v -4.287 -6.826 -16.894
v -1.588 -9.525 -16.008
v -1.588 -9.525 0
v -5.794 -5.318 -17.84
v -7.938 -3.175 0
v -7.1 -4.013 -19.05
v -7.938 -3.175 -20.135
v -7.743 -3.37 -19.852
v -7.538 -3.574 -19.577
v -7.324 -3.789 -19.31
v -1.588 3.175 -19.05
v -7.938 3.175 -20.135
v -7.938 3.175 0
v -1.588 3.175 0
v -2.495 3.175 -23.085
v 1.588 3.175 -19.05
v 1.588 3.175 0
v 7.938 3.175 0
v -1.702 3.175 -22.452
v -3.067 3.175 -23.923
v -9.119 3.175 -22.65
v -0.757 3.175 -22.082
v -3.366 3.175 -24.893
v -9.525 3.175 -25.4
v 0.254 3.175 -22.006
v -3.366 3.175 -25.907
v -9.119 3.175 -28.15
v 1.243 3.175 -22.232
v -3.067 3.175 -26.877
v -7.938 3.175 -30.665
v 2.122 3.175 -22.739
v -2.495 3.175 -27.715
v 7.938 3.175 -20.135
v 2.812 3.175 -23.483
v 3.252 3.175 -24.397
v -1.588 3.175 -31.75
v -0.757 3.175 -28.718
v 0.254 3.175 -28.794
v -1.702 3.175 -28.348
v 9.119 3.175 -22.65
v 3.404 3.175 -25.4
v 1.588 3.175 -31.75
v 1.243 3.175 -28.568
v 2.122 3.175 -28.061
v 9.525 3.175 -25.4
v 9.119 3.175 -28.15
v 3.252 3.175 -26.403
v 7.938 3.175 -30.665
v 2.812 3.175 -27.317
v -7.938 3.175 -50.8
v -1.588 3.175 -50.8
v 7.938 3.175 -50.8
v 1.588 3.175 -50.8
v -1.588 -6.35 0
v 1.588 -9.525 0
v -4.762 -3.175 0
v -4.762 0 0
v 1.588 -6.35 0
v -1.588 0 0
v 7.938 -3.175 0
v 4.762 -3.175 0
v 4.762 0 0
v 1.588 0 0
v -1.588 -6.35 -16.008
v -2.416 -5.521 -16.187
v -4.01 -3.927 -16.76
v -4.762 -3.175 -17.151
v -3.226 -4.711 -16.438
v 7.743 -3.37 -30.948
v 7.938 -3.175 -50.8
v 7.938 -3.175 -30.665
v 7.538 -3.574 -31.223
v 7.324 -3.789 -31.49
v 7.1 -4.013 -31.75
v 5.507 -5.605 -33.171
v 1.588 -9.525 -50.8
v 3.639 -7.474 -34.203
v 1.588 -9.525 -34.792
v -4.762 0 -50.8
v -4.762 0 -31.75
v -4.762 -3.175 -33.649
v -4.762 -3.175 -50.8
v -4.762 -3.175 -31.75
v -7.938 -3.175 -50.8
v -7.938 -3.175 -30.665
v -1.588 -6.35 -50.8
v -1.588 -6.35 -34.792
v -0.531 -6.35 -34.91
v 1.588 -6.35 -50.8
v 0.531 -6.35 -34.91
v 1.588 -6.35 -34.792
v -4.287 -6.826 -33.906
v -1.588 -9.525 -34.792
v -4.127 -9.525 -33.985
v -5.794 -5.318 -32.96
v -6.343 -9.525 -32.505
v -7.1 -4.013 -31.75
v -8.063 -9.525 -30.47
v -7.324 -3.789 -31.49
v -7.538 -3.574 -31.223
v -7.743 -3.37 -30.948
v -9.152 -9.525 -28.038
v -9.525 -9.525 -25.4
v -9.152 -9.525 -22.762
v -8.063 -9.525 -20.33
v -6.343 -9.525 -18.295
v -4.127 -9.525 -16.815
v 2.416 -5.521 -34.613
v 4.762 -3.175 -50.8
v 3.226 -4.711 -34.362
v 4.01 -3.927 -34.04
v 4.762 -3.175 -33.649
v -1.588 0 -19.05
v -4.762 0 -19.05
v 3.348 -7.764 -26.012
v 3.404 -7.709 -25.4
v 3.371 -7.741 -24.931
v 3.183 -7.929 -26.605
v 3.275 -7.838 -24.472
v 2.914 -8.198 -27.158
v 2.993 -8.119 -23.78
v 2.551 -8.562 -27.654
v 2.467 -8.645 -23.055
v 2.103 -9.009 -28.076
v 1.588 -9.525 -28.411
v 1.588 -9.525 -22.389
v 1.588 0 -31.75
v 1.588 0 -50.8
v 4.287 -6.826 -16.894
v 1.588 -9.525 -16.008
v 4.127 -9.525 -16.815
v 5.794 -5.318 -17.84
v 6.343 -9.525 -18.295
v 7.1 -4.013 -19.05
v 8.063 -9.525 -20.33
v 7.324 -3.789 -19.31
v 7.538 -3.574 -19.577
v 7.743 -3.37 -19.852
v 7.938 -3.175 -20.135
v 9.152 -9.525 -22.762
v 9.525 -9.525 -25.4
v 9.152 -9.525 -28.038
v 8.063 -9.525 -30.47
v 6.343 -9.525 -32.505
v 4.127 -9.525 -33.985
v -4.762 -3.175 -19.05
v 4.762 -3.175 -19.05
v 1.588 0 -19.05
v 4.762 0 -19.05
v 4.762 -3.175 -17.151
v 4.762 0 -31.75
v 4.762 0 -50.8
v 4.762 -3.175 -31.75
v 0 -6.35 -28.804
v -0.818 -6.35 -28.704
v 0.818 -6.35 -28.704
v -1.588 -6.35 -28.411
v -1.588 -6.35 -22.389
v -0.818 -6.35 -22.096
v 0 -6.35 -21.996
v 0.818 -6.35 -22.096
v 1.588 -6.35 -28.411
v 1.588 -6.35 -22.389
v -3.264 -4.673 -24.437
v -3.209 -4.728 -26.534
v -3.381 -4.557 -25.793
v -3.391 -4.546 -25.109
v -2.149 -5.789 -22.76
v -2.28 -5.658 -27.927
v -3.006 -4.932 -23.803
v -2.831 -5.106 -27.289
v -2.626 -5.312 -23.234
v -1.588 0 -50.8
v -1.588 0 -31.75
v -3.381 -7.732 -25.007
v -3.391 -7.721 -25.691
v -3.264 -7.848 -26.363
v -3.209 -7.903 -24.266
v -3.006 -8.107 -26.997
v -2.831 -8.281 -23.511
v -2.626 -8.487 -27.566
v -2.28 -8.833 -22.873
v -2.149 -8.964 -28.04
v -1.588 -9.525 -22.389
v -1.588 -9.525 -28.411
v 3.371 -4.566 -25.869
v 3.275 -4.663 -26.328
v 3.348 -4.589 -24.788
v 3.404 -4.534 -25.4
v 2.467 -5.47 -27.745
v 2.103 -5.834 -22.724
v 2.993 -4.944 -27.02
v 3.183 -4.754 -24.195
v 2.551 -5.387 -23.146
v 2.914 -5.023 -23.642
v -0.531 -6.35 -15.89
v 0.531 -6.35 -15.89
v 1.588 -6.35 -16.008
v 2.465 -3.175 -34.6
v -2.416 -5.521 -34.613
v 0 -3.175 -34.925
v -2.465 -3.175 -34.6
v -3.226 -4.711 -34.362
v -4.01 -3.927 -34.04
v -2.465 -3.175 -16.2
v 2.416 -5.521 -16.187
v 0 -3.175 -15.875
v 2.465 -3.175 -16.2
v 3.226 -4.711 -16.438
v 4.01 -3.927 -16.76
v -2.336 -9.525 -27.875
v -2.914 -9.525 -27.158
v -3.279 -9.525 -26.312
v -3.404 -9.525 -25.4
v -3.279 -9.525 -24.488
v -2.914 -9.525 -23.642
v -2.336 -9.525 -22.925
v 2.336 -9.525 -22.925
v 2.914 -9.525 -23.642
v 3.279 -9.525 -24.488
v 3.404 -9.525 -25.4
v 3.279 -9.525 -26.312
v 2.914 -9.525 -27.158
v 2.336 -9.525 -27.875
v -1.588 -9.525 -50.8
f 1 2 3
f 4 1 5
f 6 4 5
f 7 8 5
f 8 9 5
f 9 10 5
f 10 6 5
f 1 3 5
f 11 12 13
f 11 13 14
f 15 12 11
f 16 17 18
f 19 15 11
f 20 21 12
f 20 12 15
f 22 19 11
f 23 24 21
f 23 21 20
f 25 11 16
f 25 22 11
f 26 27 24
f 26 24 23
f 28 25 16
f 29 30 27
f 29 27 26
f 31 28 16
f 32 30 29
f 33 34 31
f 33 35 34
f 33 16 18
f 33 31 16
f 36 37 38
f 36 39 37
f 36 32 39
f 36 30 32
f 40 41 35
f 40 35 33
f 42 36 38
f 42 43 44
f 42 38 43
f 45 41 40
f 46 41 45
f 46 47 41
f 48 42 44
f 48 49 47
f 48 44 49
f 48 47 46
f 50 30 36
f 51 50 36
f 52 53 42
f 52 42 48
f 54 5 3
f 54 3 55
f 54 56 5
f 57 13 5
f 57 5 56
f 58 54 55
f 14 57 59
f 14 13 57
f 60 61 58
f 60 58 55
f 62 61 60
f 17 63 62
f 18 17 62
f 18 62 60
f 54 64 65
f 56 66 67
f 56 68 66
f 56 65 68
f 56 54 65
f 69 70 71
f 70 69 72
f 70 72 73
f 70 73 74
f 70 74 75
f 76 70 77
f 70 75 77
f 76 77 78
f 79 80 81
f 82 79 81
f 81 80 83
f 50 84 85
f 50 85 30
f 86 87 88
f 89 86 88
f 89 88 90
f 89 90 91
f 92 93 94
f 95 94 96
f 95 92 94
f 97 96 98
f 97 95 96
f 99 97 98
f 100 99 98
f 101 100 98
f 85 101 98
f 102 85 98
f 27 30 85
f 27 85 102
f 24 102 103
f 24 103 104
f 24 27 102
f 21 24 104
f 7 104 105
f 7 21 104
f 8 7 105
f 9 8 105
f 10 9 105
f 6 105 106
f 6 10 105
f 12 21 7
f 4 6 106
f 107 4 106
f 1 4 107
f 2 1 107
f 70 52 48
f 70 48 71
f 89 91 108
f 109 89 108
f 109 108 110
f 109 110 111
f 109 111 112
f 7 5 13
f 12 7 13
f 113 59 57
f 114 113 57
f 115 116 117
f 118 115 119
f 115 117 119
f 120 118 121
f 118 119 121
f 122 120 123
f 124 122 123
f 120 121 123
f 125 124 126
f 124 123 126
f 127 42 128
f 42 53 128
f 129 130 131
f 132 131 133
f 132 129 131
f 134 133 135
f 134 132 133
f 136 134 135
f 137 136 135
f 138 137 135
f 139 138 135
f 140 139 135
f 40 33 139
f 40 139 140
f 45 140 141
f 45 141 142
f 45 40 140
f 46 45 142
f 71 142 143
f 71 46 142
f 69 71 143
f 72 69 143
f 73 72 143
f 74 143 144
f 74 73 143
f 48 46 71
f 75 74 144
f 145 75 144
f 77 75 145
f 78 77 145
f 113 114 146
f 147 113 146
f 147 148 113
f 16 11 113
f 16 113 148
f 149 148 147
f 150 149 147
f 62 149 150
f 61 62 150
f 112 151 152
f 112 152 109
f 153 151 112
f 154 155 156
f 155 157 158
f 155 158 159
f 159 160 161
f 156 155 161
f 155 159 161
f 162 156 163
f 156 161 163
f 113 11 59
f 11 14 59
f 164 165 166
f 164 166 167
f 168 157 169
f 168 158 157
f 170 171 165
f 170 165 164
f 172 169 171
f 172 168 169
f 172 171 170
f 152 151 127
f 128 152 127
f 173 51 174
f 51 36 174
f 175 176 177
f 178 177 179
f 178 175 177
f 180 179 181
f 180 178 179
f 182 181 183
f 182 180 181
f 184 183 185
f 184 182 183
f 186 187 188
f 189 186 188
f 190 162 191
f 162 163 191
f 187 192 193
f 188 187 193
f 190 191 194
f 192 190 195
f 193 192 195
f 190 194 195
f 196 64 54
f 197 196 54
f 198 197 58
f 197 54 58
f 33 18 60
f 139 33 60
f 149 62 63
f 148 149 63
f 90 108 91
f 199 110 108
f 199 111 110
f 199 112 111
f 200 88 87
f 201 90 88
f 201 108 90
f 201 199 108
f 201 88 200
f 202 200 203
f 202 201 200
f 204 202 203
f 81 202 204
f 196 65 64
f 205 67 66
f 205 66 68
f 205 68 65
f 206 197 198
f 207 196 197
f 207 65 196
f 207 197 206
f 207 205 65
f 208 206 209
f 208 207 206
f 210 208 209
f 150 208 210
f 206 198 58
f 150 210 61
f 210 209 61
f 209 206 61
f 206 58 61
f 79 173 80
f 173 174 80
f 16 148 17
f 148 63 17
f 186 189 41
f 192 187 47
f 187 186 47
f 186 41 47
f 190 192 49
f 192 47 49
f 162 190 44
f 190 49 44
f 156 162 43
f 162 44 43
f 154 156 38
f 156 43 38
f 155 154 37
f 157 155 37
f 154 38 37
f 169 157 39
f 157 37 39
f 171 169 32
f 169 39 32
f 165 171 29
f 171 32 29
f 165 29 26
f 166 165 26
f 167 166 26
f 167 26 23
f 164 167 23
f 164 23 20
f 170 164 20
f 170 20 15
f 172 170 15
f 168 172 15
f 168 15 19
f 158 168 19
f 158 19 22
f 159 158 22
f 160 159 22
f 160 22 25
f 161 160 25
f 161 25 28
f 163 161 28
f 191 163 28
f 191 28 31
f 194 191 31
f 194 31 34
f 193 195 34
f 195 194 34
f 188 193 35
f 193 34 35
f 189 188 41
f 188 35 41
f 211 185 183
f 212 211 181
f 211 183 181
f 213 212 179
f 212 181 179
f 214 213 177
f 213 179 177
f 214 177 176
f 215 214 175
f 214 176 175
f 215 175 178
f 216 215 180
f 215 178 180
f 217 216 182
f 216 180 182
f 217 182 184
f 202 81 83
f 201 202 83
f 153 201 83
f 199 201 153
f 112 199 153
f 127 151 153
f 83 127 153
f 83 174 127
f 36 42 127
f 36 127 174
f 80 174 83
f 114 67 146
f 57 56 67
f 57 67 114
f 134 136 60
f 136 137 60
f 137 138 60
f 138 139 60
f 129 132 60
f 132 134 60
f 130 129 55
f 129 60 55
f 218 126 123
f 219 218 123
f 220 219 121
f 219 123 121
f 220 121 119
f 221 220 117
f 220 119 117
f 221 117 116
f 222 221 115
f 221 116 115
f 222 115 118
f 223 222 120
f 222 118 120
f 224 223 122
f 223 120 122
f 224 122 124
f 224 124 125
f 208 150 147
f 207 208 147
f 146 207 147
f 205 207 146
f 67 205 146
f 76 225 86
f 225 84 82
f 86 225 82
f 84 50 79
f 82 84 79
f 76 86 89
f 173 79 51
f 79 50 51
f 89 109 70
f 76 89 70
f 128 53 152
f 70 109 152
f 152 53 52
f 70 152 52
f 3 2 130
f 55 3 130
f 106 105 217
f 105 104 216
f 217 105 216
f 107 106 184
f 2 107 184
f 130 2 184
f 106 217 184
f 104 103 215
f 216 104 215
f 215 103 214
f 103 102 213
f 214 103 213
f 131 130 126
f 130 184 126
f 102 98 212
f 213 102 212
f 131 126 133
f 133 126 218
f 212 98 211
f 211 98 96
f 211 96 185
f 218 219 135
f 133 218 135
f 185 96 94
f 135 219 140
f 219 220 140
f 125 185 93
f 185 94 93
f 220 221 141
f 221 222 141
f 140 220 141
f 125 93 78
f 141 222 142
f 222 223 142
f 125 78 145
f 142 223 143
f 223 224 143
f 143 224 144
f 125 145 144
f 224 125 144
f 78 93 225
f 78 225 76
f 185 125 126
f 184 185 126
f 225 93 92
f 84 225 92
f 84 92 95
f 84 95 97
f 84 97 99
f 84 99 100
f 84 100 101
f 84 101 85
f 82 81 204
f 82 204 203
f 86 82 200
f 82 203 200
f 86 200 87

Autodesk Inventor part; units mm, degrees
ref_plane "YZ Plane" through (0, 0, 0) normal (1, 0, 0) x (0, 1, 0)
ref_plane "XZ Plane" through (0, 0, 0) normal (0, 1, 0) x (-1, 0, 0)
ref_plane "XY Plane" through (0, 0, 0) normal (0, 0, 1) x (1, 0, 0)
sketch "Sketch1" plane through (0, 0, 0) normal (0, 0, 1) x (1, 0, 0)
  line L0 (1.5875, 3.175) -> (7.9375, 3.175)
  line L1 (7.9375, 3.175) -> (7.9375, 0)
  line L2 (7.9375, 0) -> (1.5875, 0)
  line L3 (1.5875, 0) -> (1.5875, 3.175)
  line L4 (-7.9375, 3.175) -> (-1.5875, 3.175)
  line L5 (-1.5875, 3.175) -> (-1.5875, 0)
  line L6 (-1.5875, 0) -> (-7.9375, 0)
  line L7 (-7.9375, 0) -> (-7.9375, 3.175)
  line L8 (7.9375, 0) -> (4.7625, 0)
  line L9 (4.7625, 0) -> (4.7625, -3.175)
  line L10 (4.7625, -3.175) -> (7.9375, -3.175)
  line L11 (7.9375, -3.175) -> (7.9375, 0)
  line L12 (-7.9375, 0) -> (-4.7625, 0)
  line L13 (-4.7625, 0) -> (-4.7625, -3.175)
  line L14 (-4.7625, -3.175) -> (-7.9375, -3.175)
  line L15 (-7.9375, -3.175) -> (-7.9375, 0)
  line L16 (-4.7625, -3.175) -> (-1.5875, -6.35)
  line L17 (-1.5875, -6.35) -> (1.5875, -6.35)
  line L18 (1.5875, -6.35) -> (4.7625, -3.175)
  line L19 (7.9375, -3.175) -> (1.5875, -9.525)
  line L20 (1.5875, -9.525) -> (-1.5875, -9.525)
  line L21 (-1.5875, -9.525) -> (-7.9375, -3.175)
  line L22 (-7.9375, -3.175) -> (-4.7625, -3.175)
  point P0 (0, 0)
  dimension "d0" = 6.35
  dimension "d1" = 3.175
  dimension "d2" = 1.5875
  dimension "d3" = 3.175
  dimension "d4" = 6.35
  dimension "d5" = 3.175
  dimension "d6" = 3.175
  dimension "d7" = 4.7625
  dimension "d8" = 4.7625
  dimension "d9" = 3.175
  dimension "d10" = 3.175
  dimension "d11" = 135
  dimension "d12" = 3.175
extrude "Extrusion1" add sketch "Sketch1" against normal blind 50.8
sketch "Sketch2" plane through (7.9375, -3.175, 0) normal (1, 0, 0) x (0, 0, -1)
  line L0 (0, 3.175) -> (50.8, 3.175) projected
  line L1 (3.175, 3.175) -> (6.35, 3.175)
  line L2 (6.35, 3.175) -> (6.35, -6.35)
  line L3 (6.35, -6.35) -> (3.175, -6.35)
  line L4 (3.175, -6.35) -> (3.175, 3.175)
  line L5 (0, 0) -> (0, 6.35) projected
  line L6 (9.525, 3.175) -> (12.7, 3.175)
  line L7 (12.7, 3.175) -> (12.7, -6.35)
  line L8 (12.7, -6.35) -> (9.525, -6.35)
  line L9 (9.525, -6.35) -> (9.525, 3.175)
  line L10 (15.875, 3.175) -> (19.05, 3.175)
  line L11 (19.05, 3.175) -> (19.05, -6.35)
  line L12 (19.05, -6.35) -> (15.875, -6.35)
  line L13 (15.875, -6.35) -> (15.875, 3.175)
  line L14 (22.225, 3.175) -> (25.4, 3.175)
  line L15 (25.4, 3.175) -> (25.4, -6.35)
  line L16 (25.4, -6.35) -> (22.225, -6.35)
  line L17 (22.225, -6.35) -> (22.225, 3.175)
  line L18 (28.575, 3.175) -> (31.75, 3.175)
  line L19 (31.75, 3.175) -> (31.75, -6.35)
  line L20 (31.75, -6.35) -> (28.575, -6.35)
  line L21 (28.575, -6.35) -> (28.575, 3.175)
  line L22 (34.925, 3.175) -> (38.1, 3.175)
  line L23 (38.1, 3.175) -> (38.1, -6.35)
  line L24 (38.1, -6.35) -> (34.925, -6.35)
  line L25 (34.925, -6.35) -> (34.925, 3.175)
  line L26 (41.275, 3.175) -> (44.45, 3.175)
  line L27 (44.45, 3.175) -> (44.45, -6.35)
  line L28 (44.45, -6.35) -> (41.275, -6.35)
  line L29 (41.275, -6.35) -> (41.275, 3.175)
  line L30 (47.625, 3.175) -> (50.8, 3.175)
  line L31 (50.8, 3.175) -> (50.8, -6.35)
  line L32 (50.8, -6.35) -> (47.625, -6.35)
  line L33 (47.625, -6.35) -> (47.625, 3.175)
  dimension "d15" = 3.175
  dimension "d16" = 3.175
  dimension "d17" = 9.525
  dimension "d18" = 3.175
  dimension "d19" = 3.175
  dimension "d20" = 3.175
  dimension "d21" = 3.175
  dimension "d22" = 3.175
  dimension "d23" = 3.175
  dimension "d24" = 3.175
  dimension "d25" = 3.175
  dimension "d26" = 3.175
  dimension "d27" = 3.175
  dimension "d28" = 3.175
  dimension "d29" = 3.175
  dimension "d30" = 3.175
  dimension "d31" = 3.175
extrude "Extrusion2" cut sketch "Sketch2" against normal blind 6.35
sketch "Sketch3" plane through (-7.9375, -3.175, 0) normal (-1, 0, 0) x (0, 0, 1)
  line L0 (-3.175, 3.175) -> (-3.175, 3.175)
  line L1 (-50.8, 3.175) -> (-47.625, 3.175)
  line L2 (-47.625, 3.175) -> (-47.625, -6.35)
  line L3 (-47.625, -6.35) -> (-50.8, -6.35)
  line L4 (-50.8, -6.35) -> (-50.8, 3.175)
  line L5 (-44.45, 3.175) -> (-41.275, 3.175)
  line L6 (-41.275, 3.175) -> (-41.275, -6.35)
  line L7 (-41.275, -6.35) -> (-44.45, -6.35)
  line L8 (-44.45, -6.35) -> (-44.45, 3.175)
  line L9 (-38.1, 3.175) -> (-34.925, 3.175)
  line L10 (-34.925, 3.175) -> (-34.925, -6.35)
  line L11 (-34.925, -6.35) -> (-38.1, -6.35)
  line L12 (-38.1, -6.35) -> (-38.1, 3.175)
  line L13 (-31.75, 3.175) -> (-28.575, 3.175)
  line L14 (-28.575, 3.175) -> (-28.575, -6.35)
  line L15 (-28.575, -6.35) -> (-31.75, -6.35)
  line L16 (-31.75, -6.35) -> (-31.75, 3.175)
  line L17 (-25.4, 3.175) -> (-22.225, 3.175)
  line L18 (-22.225, 3.175) -> (-22.225, -6.35)
  line L19 (-22.225, -6.35) -> (-25.4, -6.35)
  line L20 (-25.4, -6.35) -> (-25.4, 3.175)
  line L21 (-19.05, 3.175) -> (-15.875, 3.175)
  line L22 (-15.875, 3.175) -> (-15.875, -6.35)
  line L23 (-15.875, -6.35) -> (-19.05, -6.35)
  line L24 (-19.05, -6.35) -> (-19.05, 3.175)
  line L25 (-12.7, 3.175) -> (-9.525, 3.175)
  line L26 (-9.525, 3.175) -> (-9.525, -6.35)
  line L27 (-9.525, -6.35) -> (-12.7, -6.35)
  line L28 (-12.7, -6.35) -> (-12.7, 3.175)
  line L29 (-6.35, -6.35) -> (-6.35, 3.175)
  line L30 (-6.35, 3.175) -> (-3.175, 3.175)
  line L31 (-3.175, 3.175) -> (-3.175, -6.35)
  line L32 (-3.175, -6.35) -> (-6.35, -6.35)
  point P0 (0, 3.175)
  point P1 (-3.175, 0)
  dimension "d34" = 3.175
  dimension "d35" = 9.525
  dimension "d36" = 3.175
  dimension "d37" = 3.175
  dimension "d38" = 3.175
  dimension "d39" = 3.175
  dimension "d40" = 3.175
  dimension "d41" = 3.175
  dimension "d42" = 3.175
  dimension "d43" = 3.175
  dimension "d44" = 3.175
  dimension "d45" = 3.175
  dimension "d46" = 3.175
  dimension "d47" = 3.175
  dimension "d48" = 3.175
  dimension "d49" = 3.175
extrude "Extrusion3" cut sketch "Sketch3" against normal blind 6.35
sketch "Sketch4" plane through (-7.9375, 3.175, 0) normal (0, 1, 0) x (1, 0, 0)
  circle A0 centre (7.9375, 25.4) radius 9.525
  point P0 (7.9375, 0)
  dimension "d52" = 19.05
extrude "Extrusion4" add sketch "Sketch4" against normal blind 12.7
sketch "Sketch5" plane through (-7.9375, 3.175, 0) normal (0, 1, 0) x (1, 0, 0)
  arc A0 (6.35, 34.7918) -> (6.35, 16.0082) centre (7.9375, 25.4) ccw projected
  circle A1 centre (7.9375, 25.4) radius 3.4036
  point P0 (7.9375, 0)
  dimension "d55" = 6.8072
extrude "Extrusion5" cut sketch "Sketch5" against normal blind 12.7
sketch "Sketch6" plane through (0, 0, 0) normal (0, 0, 1) x (1, 0, 0)
  line L0 (-1.5875, 3.175) -> (-1.5875, 0) projected
  line L1 (-1.5875, 3.175) -> (1.5875, 3.175)
  line L2 (1.5875, 3.175) -> (1.5875, -3.175)
  line L3 (1.5875, -3.175) -> (-1.5875, -3.175)
  line L4 (-1.5875, -3.175) -> (-1.5875, 3.175)
  line L5 (-4.7625, -3.175) -> (-4.7625, 0) projected
  line L6 (-4.7625, 0) -> (4.7625, 0)
  line L7 (4.7625, 0) -> (4.7625, -3.175)
  line L8 (4.7625, -3.175) -> (-4.7625, -3.175)
  line L9 (-4.7625, -3.175) -> (-4.7625, 0)
  point P0 (0, 0)
extrude "Extrusion6" cut sketch "Sketch6" against normal blind 19.05
sketch "Sketch7" plane through (0, 0, -50.8) normal (0, 0, -1) x (-1, 0, 0)
  line L0 (-1.5875, 3.175) -> (-1.5875, 0)
  line L1 (-1.5875, 3.175) -> (1.5875, 3.175)
  line L2 (1.5875, 3.175) -> (1.5875, -3.175)
  line L3 (1.5875, -3.175) -> (-1.5875, -3.175)
  line L4 (-1.5875, -3.175) -> (-1.5875, 3.175)
  line L5 (-4.7625, -3.175) -> (-4.7625, 0)
  line L6 (-4.7625, 0) -> (4.7625, 0)
  line L7 (4.7625, 0) -> (4.7625, -3.175)
  line L8 (4.7625, -3.175) -> (-4.7625, -3.175)
  line L9 (-4.7625, -3.175) -> (-4.7625, 0)
  point P0 (0, 0)
  point P1 (0, 0)
extrude "Extrusion7" cut sketch "Sketch7" against normal blind 19.05
sketch "Sketch9" plane through (0, 0, 0) normal (0, 0, 1) x (1, 0, 0)
  line L0 (4.7625, 0) -> (1.5875, 0) projected
  line L1 (4.7625, -3.175) -> (4.7625, 0) projected
  line L2 (4.7625, 0) -> (4.7625, -3.175)
  line L3 (1.5875, -6.35) -> (4.7625, -3.175) projected
  line L4 (4.7625, -3.175) -> (1.5875, -6.35)
  line L5 (-1.5875, -6.35) -> (1.5875, -6.35) projected
  line L6 (1.5875, -6.35) -> (-1.5875, -6.35)
  line L7 (-1.5875, -6.35) -> (-4.7625, -3.175) projected
  line L8 (-1.5875, -6.35) -> (-4.7625, -3.175)
  line L9 (-4.7625, -3.175) -> (-4.7625, 0)
  line L10 (-7.9375, 0) -> (-4.7625, 0) projected
  line L11 (-4.7625, 0) -> (-7.9375, 0)
  line L12 (-7.9375, 0) -> (-7.9375, -3.175)
  line L13 (-7.9375, -3.175) -> (-1.5875, -9.525)
  line L14 (-7.0995, -4.013) -> (-7.9375, -3.175) projected
  line L15 (-1.5875, -9.525) -> (1.5875, -9.525) projected
  line L16 (-1.5875, -9.525) -> (1.5875, -9.525)
  line L17 (7.9375, -3.175) -> (1.5875, -9.525) projected
  line L18 (1.5875, -9.525) -> (7.9375, -3.175)
  line L19 (7.9375, 0) -> (7.9375, -3.175) projected
  line L20 (7.9375, -3.175) -> (7.9375, 0)
  line L21 (7.9375, 0) -> (4.7625, 0)
  point P0 (0, 0)
extrude "Extrusion8" add sketch "Sketch9" against normal blind 50.8
sketch "Sketch12" plane through (7.9375, -3.175, 0) normal (1, 0, 0) x (0, 0, -1)
  line L0 (3.175, 3.175) -> (6.35, 3.175)
  line L1 (0, 3.175) -> (19.05, 3.175) projected
  line L2 (0, 0) -> (17.1511, 0) projected
  line L3 (6.35, 3.175) -> (3.175, 0)
  line L4 (3.175, 0) -> (3.175, 3.175)
  line L5 (0, 0) -> (0, 6.35) projected
  line L6 (9.525, 3.175) -> (3.175, -3.175)
  line L7 (3.175, -3.175) -> (6.35, -3.175)
  line L8 (6.35, -3.175) -> (12.7, 3.175)
  line L9 (0, 3.175) -> (19.05, 3.175) projected
  dimension "d67" = 3.175
properties part number "Basic_rail2"
